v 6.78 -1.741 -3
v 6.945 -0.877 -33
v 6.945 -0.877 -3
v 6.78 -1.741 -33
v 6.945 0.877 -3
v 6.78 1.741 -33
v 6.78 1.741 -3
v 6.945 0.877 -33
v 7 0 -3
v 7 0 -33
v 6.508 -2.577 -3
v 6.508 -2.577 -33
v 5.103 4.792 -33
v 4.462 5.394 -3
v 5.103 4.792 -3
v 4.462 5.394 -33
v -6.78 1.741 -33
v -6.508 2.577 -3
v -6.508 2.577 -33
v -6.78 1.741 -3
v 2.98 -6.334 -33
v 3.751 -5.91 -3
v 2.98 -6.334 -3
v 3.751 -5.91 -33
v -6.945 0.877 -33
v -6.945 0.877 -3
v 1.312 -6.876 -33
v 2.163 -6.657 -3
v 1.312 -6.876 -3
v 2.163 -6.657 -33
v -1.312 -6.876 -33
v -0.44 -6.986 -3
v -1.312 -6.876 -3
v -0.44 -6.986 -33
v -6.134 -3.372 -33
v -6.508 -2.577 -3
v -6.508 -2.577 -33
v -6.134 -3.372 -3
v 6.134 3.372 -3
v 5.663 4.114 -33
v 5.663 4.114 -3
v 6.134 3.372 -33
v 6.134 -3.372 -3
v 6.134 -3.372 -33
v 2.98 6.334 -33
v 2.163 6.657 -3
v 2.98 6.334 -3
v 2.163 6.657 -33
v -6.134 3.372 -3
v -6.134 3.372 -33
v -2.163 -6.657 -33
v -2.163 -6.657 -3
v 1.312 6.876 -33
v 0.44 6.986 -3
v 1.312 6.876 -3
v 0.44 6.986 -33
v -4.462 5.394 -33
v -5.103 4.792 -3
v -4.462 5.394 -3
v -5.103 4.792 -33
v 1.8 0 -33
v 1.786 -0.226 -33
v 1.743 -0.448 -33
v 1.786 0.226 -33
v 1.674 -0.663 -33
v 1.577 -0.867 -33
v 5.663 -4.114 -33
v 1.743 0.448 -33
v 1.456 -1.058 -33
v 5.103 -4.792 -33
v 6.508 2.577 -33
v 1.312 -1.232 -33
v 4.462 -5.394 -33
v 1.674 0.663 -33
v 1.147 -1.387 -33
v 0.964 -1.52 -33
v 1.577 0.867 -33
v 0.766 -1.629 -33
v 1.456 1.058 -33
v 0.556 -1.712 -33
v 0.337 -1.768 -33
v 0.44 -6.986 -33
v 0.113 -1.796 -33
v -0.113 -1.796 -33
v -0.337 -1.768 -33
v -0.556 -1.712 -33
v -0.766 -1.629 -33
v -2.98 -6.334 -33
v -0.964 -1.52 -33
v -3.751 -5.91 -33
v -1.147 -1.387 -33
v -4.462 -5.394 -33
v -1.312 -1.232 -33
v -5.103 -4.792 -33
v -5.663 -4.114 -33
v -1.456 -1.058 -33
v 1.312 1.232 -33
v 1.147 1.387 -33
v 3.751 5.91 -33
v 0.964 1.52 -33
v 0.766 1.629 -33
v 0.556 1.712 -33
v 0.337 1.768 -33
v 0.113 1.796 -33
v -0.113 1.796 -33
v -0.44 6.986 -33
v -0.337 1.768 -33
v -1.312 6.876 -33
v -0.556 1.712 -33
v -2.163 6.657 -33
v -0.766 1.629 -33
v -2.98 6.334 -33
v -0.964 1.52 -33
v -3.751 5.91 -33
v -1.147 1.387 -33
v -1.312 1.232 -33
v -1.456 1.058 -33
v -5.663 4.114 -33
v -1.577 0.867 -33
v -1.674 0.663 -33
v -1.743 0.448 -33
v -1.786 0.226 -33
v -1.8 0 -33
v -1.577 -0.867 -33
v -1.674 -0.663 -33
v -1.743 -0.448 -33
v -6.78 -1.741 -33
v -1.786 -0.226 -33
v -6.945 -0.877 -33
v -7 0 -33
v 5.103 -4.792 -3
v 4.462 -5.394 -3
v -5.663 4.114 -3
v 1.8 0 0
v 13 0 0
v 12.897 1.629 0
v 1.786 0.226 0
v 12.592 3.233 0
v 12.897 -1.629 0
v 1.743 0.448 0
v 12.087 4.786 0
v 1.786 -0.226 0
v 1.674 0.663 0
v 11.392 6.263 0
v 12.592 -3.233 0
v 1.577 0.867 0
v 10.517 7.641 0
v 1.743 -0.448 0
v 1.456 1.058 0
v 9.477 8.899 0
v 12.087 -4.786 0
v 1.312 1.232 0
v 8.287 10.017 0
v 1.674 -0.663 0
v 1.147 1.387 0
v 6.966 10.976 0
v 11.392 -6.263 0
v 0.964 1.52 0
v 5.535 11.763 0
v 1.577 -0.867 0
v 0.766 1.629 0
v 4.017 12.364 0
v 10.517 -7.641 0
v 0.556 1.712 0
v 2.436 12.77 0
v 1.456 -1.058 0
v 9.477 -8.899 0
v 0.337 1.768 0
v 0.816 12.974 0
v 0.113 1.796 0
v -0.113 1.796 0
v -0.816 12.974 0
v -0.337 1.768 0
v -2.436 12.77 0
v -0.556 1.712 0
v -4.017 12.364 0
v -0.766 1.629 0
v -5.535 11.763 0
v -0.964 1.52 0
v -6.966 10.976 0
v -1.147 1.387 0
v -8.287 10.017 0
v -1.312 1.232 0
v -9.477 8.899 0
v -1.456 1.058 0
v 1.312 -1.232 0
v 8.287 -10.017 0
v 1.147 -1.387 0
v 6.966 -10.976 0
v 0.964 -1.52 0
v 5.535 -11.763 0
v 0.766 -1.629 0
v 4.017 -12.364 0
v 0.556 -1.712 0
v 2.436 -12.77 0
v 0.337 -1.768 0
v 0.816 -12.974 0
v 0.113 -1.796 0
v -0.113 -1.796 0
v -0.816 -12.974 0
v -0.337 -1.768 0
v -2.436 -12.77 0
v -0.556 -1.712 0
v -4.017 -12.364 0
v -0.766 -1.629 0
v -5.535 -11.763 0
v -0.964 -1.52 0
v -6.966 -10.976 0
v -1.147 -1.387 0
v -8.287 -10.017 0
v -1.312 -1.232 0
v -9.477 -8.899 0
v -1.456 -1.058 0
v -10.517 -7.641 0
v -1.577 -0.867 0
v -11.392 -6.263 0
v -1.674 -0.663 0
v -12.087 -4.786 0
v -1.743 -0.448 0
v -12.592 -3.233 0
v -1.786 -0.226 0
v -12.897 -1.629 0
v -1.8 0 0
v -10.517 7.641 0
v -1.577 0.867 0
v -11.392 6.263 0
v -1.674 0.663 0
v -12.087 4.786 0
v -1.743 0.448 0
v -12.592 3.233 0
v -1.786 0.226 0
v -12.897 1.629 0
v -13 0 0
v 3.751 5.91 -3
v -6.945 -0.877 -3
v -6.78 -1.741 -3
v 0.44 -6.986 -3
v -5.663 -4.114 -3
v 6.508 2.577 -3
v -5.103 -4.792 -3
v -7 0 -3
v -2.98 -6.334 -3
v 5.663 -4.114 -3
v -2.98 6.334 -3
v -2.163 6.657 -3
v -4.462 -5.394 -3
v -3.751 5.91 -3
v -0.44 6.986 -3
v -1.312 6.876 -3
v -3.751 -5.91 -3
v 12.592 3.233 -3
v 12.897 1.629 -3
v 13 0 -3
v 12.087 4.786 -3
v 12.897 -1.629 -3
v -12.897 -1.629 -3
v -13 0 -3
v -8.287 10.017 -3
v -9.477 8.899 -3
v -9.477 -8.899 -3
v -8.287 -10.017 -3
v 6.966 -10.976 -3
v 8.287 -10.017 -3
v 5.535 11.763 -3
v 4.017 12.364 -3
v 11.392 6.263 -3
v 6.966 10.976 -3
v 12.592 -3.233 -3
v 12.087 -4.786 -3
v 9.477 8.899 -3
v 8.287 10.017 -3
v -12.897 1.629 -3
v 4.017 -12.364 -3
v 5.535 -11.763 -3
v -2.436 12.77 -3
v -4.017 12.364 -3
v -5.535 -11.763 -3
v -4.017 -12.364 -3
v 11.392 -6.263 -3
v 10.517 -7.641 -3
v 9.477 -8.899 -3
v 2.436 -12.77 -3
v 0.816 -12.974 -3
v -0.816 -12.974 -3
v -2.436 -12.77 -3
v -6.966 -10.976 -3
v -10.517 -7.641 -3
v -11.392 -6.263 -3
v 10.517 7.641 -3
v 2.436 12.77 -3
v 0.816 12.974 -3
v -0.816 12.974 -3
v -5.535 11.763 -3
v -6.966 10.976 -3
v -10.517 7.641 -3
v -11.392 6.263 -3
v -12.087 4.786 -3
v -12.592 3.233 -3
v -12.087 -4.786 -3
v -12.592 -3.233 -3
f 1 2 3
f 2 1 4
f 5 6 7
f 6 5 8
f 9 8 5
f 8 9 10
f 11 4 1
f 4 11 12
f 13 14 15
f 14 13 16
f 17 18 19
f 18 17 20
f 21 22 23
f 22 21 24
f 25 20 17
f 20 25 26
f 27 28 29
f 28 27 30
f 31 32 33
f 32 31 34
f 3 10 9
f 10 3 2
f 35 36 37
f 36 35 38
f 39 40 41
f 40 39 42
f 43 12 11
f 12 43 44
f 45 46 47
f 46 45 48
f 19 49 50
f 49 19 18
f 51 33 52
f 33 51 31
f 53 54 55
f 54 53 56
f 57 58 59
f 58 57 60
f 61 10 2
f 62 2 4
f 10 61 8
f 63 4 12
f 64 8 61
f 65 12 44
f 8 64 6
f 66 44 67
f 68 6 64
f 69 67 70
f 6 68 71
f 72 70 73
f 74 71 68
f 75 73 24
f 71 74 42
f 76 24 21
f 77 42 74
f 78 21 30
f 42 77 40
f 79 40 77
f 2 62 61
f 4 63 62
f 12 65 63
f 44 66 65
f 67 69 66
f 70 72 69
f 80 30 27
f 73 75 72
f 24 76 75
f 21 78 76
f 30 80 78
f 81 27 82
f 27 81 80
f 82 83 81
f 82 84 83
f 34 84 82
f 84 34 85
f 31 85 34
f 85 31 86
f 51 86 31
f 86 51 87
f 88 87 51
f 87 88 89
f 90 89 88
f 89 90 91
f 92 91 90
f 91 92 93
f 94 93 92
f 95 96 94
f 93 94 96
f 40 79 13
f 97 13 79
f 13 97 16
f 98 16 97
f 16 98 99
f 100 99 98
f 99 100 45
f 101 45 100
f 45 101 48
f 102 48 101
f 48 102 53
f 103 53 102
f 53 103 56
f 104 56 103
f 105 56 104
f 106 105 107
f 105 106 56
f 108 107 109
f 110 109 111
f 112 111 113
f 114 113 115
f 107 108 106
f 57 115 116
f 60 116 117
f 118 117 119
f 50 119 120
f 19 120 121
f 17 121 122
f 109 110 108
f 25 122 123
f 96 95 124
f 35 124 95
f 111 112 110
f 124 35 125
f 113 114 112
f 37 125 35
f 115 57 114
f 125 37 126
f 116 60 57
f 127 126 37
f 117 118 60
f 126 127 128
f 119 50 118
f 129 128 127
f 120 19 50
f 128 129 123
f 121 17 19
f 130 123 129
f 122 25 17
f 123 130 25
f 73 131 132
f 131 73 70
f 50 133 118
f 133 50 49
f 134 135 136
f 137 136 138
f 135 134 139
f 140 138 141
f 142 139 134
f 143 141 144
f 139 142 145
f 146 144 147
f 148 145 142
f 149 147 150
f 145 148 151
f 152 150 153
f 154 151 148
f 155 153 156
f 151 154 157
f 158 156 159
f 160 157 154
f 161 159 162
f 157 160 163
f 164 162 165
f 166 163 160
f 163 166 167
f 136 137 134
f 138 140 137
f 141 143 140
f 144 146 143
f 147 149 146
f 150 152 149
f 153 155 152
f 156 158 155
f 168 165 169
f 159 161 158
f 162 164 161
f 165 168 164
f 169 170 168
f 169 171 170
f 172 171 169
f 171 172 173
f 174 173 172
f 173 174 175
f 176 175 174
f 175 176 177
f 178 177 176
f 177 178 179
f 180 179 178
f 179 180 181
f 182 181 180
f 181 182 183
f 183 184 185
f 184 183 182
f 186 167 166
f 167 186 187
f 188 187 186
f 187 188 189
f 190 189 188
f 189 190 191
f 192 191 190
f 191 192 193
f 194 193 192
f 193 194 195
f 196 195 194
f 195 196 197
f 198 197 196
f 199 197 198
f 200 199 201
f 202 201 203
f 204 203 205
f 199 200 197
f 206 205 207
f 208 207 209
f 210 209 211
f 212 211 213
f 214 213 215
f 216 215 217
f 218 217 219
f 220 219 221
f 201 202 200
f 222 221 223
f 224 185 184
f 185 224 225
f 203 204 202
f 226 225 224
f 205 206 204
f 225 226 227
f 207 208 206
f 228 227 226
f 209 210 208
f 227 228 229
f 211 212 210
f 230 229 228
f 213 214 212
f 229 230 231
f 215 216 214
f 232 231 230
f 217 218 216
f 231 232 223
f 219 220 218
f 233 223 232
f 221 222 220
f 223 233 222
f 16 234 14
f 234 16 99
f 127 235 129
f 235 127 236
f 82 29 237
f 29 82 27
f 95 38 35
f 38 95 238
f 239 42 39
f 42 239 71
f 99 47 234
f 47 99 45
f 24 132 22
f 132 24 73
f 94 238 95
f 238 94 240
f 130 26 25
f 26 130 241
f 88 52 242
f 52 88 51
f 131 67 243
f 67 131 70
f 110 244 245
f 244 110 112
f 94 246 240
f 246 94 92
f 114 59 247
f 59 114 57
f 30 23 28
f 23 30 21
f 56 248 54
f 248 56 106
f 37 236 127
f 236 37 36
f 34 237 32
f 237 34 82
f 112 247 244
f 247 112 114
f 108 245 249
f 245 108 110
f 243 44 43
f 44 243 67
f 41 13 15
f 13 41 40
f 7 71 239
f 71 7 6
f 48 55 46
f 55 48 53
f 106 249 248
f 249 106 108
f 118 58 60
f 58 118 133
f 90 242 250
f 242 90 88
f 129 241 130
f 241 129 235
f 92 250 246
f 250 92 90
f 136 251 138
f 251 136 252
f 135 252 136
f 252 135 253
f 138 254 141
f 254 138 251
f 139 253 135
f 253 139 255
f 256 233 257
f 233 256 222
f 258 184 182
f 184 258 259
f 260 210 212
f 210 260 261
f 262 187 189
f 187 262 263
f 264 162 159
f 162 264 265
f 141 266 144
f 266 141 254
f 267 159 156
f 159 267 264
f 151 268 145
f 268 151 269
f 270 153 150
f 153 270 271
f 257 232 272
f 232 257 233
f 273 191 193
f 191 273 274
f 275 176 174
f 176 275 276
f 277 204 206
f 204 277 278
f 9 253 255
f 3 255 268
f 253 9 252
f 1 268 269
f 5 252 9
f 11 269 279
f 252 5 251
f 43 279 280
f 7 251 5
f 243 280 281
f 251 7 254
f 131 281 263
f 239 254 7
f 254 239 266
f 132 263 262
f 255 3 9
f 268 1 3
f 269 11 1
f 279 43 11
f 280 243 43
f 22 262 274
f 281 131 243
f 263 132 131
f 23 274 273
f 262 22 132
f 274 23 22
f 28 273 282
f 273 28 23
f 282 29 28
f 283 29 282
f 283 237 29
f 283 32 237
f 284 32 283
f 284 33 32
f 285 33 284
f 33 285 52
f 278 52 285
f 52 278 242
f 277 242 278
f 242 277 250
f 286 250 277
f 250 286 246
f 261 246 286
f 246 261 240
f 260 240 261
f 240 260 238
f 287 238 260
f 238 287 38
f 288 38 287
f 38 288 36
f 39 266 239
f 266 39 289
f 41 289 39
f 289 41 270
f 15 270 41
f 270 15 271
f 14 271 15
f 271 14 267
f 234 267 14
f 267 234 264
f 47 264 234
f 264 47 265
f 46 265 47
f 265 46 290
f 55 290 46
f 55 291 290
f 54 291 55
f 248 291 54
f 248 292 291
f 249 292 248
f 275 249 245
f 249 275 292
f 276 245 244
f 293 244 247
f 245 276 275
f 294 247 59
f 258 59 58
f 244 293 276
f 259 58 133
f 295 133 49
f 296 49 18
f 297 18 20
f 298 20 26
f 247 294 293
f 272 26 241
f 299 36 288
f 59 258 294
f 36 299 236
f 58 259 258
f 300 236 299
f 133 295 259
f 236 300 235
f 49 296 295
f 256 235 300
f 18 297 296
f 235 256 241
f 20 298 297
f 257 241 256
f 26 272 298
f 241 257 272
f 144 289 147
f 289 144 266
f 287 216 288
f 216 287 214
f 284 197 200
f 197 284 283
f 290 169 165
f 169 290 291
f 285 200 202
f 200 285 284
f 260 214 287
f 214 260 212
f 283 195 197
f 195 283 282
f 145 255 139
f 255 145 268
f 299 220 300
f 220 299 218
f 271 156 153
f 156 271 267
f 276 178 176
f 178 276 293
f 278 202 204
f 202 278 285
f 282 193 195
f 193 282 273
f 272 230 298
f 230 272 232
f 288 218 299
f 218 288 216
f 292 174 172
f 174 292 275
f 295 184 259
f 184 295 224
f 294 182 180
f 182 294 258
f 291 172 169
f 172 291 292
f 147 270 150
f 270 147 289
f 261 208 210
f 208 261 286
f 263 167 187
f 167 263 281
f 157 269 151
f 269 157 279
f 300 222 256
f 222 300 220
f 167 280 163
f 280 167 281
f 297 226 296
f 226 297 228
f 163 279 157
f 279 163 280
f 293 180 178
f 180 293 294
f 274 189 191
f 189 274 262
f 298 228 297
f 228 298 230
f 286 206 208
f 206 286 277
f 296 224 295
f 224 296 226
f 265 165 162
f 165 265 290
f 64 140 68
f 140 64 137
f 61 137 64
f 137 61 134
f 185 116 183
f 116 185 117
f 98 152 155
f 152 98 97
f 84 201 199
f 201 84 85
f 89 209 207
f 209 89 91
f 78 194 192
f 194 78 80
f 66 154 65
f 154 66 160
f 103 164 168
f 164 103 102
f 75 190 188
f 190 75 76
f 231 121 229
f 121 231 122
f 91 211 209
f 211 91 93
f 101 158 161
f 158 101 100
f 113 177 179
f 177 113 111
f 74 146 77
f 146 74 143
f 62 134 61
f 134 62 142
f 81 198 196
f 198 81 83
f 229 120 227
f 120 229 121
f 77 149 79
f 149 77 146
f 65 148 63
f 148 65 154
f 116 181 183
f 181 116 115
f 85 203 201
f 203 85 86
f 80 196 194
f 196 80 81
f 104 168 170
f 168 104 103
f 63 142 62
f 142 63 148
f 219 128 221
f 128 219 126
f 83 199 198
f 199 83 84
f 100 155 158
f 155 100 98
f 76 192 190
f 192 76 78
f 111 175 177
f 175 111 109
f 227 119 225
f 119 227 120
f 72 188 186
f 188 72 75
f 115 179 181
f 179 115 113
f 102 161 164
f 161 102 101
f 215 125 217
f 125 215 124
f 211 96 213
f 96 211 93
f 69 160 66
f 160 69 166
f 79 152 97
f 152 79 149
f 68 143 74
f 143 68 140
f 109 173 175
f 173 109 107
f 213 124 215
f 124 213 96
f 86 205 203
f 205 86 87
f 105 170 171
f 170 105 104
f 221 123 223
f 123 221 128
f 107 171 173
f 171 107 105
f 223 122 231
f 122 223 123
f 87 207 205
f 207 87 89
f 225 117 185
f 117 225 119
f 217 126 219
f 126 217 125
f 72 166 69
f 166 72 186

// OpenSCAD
$fn = 50;


difference() {
	union() {
		translate(v = [0, 0, -33.0000000000]) {
			cylinder(h = 33, r = 7.0000000000);
		}
		translate(v = [0, 0, -3.0000000000]) {
			cylinder(h = 3, r = 13.0000000000);
		}
	}
	union() {
		#translate(v = [0, 0, -33]) {
			cylinder(h = 33, r = 1.8000000000);
		}
	}
}
